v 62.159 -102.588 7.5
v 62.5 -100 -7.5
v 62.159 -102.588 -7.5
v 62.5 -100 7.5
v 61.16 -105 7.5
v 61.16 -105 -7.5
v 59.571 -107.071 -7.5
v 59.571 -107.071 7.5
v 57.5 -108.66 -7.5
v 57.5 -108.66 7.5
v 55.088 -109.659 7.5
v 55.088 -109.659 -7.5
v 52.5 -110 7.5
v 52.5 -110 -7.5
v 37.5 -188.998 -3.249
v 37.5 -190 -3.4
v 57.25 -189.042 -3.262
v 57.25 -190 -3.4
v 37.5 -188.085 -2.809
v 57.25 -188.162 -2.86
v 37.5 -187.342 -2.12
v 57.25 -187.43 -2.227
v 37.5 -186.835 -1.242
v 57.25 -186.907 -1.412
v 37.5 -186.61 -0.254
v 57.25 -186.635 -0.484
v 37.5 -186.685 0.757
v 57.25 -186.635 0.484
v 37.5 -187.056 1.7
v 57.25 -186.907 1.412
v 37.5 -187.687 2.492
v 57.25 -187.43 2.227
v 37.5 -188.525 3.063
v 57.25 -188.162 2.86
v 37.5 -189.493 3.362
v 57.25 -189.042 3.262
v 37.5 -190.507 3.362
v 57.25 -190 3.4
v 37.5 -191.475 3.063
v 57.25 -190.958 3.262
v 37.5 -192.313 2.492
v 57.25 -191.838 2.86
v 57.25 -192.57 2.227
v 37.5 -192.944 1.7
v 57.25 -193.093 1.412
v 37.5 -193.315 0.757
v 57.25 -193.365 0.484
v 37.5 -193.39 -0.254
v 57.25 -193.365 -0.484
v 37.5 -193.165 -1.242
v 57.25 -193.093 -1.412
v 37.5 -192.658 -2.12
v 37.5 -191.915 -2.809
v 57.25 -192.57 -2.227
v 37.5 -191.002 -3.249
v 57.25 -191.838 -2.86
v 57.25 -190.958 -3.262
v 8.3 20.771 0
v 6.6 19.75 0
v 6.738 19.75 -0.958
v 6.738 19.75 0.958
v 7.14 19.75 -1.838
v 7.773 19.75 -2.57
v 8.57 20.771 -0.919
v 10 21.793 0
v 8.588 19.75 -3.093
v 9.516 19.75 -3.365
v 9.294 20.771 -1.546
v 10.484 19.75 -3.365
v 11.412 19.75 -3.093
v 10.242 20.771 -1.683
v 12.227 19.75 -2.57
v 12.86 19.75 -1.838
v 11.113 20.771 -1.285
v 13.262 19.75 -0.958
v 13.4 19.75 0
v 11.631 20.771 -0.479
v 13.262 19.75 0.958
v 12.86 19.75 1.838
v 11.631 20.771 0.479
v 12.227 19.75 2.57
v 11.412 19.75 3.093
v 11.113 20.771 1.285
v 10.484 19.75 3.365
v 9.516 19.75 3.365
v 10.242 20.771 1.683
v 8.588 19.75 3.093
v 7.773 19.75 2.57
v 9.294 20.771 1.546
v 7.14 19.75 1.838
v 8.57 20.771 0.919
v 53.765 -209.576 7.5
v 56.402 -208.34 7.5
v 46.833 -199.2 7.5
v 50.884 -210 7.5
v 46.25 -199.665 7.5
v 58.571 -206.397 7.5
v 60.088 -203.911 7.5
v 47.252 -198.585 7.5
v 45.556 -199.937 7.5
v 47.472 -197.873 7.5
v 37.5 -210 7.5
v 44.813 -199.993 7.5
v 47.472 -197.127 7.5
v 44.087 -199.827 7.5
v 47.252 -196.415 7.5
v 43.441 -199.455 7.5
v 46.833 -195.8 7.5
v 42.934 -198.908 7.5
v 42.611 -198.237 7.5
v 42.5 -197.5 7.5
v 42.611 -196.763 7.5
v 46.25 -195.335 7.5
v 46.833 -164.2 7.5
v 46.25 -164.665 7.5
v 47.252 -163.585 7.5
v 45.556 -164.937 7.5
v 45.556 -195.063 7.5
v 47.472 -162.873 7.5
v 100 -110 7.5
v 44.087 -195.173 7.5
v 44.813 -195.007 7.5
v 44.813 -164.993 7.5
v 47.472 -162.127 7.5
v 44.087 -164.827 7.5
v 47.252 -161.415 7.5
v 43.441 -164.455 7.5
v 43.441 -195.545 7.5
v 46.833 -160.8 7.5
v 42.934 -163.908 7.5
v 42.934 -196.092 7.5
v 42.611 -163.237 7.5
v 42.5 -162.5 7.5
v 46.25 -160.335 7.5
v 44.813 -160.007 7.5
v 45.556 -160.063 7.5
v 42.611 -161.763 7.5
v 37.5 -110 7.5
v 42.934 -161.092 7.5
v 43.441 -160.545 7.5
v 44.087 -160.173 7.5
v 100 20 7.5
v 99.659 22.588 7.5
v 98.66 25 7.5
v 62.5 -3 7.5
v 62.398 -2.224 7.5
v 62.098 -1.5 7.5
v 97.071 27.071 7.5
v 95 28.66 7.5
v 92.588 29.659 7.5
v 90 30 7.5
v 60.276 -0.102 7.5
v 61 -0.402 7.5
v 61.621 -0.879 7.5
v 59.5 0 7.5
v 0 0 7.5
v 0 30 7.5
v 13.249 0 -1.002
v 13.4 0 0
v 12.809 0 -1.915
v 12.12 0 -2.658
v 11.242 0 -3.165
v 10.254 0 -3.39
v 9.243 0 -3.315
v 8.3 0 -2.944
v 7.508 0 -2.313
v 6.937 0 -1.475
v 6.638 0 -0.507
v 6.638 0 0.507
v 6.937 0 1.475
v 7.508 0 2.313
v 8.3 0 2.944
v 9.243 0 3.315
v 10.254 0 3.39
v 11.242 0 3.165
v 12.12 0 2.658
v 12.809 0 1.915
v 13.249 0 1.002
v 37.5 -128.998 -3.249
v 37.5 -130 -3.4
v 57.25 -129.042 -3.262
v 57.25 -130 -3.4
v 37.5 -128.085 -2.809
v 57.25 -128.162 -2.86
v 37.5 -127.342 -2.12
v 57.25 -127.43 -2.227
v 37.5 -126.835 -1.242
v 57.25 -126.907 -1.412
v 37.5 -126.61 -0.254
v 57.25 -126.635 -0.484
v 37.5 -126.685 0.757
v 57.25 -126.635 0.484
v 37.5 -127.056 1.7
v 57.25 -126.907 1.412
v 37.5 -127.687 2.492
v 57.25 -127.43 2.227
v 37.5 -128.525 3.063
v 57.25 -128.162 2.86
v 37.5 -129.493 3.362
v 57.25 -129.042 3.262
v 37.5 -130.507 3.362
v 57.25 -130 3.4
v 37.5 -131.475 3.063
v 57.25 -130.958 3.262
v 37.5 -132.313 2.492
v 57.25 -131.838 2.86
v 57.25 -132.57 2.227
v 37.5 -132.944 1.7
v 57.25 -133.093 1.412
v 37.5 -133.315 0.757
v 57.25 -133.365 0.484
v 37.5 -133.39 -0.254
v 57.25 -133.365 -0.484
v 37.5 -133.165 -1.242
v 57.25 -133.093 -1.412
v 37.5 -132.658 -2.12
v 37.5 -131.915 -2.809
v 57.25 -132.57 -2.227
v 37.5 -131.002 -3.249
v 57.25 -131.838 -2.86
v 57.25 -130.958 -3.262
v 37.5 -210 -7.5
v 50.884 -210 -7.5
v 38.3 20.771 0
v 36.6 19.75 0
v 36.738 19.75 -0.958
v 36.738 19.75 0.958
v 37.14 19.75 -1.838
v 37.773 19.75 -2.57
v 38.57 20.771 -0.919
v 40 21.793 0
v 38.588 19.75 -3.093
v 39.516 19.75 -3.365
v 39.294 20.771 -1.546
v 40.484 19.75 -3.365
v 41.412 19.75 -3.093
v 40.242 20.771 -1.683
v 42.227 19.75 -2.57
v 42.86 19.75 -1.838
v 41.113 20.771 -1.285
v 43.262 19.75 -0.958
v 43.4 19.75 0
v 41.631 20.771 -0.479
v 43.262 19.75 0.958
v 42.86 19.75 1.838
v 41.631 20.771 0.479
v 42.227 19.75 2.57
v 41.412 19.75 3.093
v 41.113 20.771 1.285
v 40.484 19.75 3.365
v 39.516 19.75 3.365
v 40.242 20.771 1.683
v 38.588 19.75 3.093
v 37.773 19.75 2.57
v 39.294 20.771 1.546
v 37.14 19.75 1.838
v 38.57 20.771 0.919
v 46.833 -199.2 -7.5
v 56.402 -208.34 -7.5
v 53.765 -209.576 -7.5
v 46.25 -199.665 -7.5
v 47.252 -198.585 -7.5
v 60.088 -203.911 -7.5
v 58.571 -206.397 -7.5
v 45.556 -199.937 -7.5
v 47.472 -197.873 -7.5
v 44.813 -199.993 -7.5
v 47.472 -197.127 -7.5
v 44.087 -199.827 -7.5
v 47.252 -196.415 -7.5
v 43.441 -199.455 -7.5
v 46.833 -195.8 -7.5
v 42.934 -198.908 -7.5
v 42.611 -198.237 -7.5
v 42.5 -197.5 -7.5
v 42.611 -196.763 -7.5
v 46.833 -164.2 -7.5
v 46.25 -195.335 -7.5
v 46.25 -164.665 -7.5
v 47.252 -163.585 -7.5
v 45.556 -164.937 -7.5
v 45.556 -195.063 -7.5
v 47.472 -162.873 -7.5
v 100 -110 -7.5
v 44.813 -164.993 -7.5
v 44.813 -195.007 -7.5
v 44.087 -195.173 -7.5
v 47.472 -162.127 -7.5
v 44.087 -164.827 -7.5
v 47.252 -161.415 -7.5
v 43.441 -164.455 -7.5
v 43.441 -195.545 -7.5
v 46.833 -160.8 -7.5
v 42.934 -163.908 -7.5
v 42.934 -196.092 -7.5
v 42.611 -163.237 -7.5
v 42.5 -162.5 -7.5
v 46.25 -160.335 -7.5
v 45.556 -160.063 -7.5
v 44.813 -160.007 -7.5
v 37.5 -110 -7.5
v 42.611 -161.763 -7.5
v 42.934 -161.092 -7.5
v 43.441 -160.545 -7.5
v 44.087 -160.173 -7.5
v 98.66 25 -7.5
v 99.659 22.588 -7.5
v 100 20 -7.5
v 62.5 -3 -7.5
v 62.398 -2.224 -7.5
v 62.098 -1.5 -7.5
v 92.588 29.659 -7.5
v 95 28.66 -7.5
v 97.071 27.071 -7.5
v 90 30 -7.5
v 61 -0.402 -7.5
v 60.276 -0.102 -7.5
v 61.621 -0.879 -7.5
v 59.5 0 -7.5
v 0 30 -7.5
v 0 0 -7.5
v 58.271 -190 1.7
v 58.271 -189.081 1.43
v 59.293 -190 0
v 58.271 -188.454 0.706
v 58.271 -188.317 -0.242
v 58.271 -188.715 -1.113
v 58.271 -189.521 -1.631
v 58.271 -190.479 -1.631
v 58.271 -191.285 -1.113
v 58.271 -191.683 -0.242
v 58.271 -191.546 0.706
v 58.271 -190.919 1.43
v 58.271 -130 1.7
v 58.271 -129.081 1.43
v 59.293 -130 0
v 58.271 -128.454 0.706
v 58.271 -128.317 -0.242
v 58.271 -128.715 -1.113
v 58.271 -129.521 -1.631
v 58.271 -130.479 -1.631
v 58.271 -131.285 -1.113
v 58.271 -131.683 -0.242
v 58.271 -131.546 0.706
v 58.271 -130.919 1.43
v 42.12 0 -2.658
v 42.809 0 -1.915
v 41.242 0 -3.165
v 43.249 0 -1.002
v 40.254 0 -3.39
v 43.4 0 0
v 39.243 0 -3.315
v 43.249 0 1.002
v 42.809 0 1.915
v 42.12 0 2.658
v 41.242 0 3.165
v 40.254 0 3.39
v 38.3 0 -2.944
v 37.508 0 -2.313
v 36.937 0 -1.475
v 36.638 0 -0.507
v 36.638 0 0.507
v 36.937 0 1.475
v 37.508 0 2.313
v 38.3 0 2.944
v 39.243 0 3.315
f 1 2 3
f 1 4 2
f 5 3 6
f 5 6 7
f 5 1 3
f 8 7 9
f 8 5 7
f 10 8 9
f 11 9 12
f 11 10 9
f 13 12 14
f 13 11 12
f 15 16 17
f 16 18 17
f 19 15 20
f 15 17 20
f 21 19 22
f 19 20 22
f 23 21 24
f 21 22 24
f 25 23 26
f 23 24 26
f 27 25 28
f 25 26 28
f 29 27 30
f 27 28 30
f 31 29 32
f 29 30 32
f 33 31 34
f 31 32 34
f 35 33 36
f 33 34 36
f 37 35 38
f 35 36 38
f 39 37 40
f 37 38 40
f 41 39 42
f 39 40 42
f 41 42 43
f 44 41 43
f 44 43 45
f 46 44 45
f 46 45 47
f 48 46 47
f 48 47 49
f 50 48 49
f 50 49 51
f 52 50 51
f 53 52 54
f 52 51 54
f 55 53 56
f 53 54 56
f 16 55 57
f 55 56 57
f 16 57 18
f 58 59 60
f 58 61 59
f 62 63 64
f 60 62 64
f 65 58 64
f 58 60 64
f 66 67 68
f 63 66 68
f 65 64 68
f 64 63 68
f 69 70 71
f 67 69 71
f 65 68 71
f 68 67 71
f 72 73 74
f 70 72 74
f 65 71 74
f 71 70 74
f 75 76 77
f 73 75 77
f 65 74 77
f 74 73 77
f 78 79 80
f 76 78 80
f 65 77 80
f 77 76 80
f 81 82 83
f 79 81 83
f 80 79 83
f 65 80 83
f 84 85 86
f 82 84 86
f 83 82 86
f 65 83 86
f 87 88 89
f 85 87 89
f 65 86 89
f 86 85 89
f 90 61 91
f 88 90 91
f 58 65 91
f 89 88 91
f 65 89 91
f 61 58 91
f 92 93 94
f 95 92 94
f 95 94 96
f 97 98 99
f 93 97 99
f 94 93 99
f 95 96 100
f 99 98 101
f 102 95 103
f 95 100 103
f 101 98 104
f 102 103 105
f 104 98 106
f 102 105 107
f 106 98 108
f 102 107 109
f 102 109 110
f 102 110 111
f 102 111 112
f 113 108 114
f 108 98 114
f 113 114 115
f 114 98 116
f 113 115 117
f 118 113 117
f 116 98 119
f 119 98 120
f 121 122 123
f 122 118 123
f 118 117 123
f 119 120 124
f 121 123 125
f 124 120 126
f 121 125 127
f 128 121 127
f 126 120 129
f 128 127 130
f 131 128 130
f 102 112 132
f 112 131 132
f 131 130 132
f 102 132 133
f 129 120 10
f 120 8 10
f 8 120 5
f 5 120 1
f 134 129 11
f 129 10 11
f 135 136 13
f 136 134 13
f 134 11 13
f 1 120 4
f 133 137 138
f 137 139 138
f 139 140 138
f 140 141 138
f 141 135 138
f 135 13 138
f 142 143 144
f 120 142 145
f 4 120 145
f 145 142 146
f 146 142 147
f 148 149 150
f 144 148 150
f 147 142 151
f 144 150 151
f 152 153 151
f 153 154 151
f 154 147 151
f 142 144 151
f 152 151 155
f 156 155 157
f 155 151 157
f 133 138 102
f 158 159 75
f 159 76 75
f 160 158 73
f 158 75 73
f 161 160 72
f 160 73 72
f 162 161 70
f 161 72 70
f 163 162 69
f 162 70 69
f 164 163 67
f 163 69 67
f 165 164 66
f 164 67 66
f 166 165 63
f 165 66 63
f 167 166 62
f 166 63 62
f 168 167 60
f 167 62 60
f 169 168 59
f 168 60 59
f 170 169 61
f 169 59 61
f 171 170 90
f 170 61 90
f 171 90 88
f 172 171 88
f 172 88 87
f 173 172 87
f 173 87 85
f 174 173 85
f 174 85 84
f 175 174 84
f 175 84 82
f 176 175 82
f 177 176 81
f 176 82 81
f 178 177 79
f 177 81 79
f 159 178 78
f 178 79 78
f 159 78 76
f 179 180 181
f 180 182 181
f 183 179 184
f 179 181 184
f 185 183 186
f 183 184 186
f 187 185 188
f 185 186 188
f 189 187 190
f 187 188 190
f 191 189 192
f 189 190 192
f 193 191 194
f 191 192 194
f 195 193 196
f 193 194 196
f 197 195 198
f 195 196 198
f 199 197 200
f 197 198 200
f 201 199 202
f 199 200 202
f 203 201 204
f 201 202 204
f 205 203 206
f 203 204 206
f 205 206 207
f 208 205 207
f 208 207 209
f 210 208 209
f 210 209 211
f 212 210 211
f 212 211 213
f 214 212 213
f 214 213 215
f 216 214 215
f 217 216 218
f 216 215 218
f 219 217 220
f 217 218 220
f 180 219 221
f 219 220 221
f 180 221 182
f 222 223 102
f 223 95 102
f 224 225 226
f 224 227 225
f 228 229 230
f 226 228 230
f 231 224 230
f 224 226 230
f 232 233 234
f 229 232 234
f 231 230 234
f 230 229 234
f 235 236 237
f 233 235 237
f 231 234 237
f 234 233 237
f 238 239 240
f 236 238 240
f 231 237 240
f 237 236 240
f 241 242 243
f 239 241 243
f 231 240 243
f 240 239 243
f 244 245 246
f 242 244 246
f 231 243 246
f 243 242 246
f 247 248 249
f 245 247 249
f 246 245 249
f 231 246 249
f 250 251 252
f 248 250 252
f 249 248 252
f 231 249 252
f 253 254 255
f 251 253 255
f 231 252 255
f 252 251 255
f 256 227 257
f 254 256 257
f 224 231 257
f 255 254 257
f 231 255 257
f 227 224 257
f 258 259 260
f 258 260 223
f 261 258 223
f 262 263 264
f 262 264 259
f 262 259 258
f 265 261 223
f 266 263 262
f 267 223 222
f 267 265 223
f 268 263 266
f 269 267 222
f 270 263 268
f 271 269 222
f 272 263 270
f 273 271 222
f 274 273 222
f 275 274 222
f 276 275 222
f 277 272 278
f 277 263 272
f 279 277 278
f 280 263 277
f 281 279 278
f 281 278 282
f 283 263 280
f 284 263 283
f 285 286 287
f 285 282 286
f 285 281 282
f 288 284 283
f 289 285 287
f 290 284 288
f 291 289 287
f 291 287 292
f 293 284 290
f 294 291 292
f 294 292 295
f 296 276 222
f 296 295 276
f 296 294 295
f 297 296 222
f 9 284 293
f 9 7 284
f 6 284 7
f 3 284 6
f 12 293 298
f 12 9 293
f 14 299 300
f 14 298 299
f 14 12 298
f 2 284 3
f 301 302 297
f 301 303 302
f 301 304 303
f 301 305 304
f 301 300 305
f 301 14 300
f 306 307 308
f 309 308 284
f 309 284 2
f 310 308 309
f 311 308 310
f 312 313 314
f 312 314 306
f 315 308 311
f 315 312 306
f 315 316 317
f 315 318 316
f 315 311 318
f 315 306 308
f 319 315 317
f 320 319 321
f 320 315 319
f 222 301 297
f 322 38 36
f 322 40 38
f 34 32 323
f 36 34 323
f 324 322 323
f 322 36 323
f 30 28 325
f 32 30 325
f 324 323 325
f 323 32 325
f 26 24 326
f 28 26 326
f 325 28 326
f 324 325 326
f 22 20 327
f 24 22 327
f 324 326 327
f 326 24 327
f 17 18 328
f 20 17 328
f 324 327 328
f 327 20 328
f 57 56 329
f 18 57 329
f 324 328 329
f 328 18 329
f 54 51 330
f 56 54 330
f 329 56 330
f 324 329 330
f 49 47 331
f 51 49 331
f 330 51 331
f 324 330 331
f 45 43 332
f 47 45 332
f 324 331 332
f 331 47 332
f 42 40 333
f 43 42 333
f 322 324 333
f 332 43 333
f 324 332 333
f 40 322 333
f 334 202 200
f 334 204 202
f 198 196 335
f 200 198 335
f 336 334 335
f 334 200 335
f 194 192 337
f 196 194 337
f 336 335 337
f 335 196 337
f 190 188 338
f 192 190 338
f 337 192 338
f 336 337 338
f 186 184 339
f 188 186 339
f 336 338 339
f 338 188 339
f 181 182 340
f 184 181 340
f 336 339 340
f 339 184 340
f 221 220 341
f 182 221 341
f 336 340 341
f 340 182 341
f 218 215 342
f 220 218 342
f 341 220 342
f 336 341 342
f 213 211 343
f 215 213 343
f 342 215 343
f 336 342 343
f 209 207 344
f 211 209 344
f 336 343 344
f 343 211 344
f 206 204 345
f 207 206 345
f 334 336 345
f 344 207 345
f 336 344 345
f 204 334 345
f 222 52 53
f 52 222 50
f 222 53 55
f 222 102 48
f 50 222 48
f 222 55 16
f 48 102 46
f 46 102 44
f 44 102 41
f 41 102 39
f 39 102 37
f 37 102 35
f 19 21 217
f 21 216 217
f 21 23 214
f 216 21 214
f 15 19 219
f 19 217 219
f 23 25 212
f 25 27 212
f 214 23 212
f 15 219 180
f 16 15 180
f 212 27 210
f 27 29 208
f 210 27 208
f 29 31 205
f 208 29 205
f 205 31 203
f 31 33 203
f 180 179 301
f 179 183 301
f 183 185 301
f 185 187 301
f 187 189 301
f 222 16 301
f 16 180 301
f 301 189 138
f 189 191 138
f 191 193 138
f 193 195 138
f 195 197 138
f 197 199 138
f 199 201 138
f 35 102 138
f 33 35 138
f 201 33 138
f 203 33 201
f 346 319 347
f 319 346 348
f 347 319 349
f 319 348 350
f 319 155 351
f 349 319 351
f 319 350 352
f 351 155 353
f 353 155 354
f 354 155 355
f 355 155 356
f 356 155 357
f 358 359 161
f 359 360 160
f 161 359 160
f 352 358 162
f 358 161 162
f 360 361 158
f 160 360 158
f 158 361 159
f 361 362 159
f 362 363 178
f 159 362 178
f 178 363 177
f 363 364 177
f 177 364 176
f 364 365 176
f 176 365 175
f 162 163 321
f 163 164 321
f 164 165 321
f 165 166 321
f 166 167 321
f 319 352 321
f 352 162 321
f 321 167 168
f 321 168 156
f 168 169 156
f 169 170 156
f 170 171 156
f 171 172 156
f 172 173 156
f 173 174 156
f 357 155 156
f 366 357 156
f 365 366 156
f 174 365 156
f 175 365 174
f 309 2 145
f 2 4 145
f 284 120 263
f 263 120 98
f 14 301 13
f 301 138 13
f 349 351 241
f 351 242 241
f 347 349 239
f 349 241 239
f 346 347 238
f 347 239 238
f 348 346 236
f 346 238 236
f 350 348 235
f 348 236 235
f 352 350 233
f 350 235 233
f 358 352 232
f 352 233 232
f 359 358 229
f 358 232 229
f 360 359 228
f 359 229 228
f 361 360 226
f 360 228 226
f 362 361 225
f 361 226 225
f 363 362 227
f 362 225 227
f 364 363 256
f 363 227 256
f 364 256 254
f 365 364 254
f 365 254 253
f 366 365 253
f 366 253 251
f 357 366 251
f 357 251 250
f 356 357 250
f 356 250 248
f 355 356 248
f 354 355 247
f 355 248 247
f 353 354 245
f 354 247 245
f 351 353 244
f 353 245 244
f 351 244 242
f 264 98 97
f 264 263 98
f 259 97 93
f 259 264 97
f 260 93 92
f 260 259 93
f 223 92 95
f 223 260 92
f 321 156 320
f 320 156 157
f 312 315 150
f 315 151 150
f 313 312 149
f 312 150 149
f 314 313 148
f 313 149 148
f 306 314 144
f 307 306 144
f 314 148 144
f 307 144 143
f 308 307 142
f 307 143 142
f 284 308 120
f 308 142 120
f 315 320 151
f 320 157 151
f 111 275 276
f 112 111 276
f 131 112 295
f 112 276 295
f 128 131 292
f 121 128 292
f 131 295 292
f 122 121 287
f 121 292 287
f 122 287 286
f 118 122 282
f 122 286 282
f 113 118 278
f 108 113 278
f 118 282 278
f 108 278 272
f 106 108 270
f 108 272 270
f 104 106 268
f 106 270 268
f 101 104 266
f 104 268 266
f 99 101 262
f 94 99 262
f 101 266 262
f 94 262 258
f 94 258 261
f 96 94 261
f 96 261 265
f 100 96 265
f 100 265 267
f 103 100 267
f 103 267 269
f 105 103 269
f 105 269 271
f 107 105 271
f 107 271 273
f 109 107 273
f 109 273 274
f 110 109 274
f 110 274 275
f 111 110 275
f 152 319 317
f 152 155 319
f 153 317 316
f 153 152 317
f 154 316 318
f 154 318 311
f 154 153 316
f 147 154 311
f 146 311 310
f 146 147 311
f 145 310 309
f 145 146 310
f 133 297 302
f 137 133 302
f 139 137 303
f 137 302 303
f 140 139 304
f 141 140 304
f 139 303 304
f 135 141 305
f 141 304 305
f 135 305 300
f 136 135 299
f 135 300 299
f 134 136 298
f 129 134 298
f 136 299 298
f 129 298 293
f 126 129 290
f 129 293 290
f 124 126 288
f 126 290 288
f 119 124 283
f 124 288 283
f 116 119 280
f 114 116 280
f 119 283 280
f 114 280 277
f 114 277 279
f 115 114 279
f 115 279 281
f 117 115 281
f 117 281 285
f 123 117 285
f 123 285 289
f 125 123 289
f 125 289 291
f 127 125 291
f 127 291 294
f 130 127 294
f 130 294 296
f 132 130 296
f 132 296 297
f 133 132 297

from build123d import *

# Parameters (mm, degrees)
EXTRUDE_1_DEPTH        = 7.5
HOLE_WIZARD_M8_1_D     = 6.8
HOLE_WIZARD_M8_1_DEPTH = 19.75
HOLE_WIZARD_M8_1_TIP   = 2.042926105
HOLE_WIZARD_M8_2_D     = 6.8
HOLE_WIZARD_M8_2_DEPTH = 19.75
HOLE_WIZARD_M8_2_TIP   = 2.042926105
FILLET_1_R             = 10
FILLET_2_R             = 3
HOLE_WIZARD_M6_1_D     = 5


with BuildPart() as part:
    # 草图1 → 凸台-拉伸1 (new body, symmetric)
    with BuildSketch(Plane.XY):
        with BuildLine():
            Line((0, 0), (0, 30))
            Line((0, 30), (90, 30))
            ThreePointArc((90, 30), (97.071067812, 27.071067812), (100, 20))
            Line((100, 20), (100, -110))
            Line((100, -110), (57.5, -210))
            Line((57.5, -210), (37.5, -210))
            Line((37.5, -210), (37.5, -110))
            Line((37.5, -110), (62.5, -110))
            Line((62.5, -110), (62.5, 0))
            Line((62.5, 0), (0, 0))
        make_face()
    extrude(amount=EXTRUDE_1_DEPTH, both=True)

    # M8 螺纹孔1
    with Locations(Plane(origin=(0, 0, 0), x_dir=(-1, 0, 0), z_dir=(0, -1, 0))):
        with Locations((-40, 0), (-10, 0)):
            Hole(HOLE_WIZARD_M8_1_D / 2, depth=HOLE_WIZARD_M8_1_DEPTH)
            with Locations((0, 0, -(HOLE_WIZARD_M8_1_DEPTH + HOLE_WIZARD_M8_1_TIP / 2))):  # 118° drill point
                Cone(0, HOLE_WIZARD_M8_1_D / 2, HOLE_WIZARD_M8_1_TIP, mode=Mode.SUBTRACT)

    # M8 螺纹孔2
    with Locations(Plane.ZY.offset(-37.5)):
        with Locations((0, -130), (0, -190)):
            Hole(HOLE_WIZARD_M8_2_D / 2, depth=HOLE_WIZARD_M8_2_DEPTH)
            with Locations((0, 0, -(HOLE_WIZARD_M8_2_DEPTH + HOLE_WIZARD_M8_2_TIP / 2))):  # 118° drill point
                Cone(0, HOLE_WIZARD_M8_2_D / 2, HOLE_WIZARD_M8_2_TIP, mode=Mode.SUBTRACT)

    # 圆角1
    fillet_1_edges = [part.edges().sort_by_distance(p)[0] for p in [
        (57.5, -210, 0),
        (62.5, -110, 0),
    ]]
    fillet(fillet_1_edges, radius=FILLET_1_R)

    # 圆角2
    fillet_2_edges = [part.edges().sort_by_distance(p)[0] for p in [
        (62.5, 0, 0),
    ]]
    fillet(fillet_2_edges, radius=FILLET_2_R)

    # M6 螺纹孔1 (through all)
    with Locations(Plane(origin=(45, -162.5, 7.5), x_dir=(1, 0, 0), z_dir=(0, 0, 1))):
        with Locations((0, 0), (0, -35)):
            Hole(HOLE_WIZARD_M6_1_D / 2)


solid = part.part
